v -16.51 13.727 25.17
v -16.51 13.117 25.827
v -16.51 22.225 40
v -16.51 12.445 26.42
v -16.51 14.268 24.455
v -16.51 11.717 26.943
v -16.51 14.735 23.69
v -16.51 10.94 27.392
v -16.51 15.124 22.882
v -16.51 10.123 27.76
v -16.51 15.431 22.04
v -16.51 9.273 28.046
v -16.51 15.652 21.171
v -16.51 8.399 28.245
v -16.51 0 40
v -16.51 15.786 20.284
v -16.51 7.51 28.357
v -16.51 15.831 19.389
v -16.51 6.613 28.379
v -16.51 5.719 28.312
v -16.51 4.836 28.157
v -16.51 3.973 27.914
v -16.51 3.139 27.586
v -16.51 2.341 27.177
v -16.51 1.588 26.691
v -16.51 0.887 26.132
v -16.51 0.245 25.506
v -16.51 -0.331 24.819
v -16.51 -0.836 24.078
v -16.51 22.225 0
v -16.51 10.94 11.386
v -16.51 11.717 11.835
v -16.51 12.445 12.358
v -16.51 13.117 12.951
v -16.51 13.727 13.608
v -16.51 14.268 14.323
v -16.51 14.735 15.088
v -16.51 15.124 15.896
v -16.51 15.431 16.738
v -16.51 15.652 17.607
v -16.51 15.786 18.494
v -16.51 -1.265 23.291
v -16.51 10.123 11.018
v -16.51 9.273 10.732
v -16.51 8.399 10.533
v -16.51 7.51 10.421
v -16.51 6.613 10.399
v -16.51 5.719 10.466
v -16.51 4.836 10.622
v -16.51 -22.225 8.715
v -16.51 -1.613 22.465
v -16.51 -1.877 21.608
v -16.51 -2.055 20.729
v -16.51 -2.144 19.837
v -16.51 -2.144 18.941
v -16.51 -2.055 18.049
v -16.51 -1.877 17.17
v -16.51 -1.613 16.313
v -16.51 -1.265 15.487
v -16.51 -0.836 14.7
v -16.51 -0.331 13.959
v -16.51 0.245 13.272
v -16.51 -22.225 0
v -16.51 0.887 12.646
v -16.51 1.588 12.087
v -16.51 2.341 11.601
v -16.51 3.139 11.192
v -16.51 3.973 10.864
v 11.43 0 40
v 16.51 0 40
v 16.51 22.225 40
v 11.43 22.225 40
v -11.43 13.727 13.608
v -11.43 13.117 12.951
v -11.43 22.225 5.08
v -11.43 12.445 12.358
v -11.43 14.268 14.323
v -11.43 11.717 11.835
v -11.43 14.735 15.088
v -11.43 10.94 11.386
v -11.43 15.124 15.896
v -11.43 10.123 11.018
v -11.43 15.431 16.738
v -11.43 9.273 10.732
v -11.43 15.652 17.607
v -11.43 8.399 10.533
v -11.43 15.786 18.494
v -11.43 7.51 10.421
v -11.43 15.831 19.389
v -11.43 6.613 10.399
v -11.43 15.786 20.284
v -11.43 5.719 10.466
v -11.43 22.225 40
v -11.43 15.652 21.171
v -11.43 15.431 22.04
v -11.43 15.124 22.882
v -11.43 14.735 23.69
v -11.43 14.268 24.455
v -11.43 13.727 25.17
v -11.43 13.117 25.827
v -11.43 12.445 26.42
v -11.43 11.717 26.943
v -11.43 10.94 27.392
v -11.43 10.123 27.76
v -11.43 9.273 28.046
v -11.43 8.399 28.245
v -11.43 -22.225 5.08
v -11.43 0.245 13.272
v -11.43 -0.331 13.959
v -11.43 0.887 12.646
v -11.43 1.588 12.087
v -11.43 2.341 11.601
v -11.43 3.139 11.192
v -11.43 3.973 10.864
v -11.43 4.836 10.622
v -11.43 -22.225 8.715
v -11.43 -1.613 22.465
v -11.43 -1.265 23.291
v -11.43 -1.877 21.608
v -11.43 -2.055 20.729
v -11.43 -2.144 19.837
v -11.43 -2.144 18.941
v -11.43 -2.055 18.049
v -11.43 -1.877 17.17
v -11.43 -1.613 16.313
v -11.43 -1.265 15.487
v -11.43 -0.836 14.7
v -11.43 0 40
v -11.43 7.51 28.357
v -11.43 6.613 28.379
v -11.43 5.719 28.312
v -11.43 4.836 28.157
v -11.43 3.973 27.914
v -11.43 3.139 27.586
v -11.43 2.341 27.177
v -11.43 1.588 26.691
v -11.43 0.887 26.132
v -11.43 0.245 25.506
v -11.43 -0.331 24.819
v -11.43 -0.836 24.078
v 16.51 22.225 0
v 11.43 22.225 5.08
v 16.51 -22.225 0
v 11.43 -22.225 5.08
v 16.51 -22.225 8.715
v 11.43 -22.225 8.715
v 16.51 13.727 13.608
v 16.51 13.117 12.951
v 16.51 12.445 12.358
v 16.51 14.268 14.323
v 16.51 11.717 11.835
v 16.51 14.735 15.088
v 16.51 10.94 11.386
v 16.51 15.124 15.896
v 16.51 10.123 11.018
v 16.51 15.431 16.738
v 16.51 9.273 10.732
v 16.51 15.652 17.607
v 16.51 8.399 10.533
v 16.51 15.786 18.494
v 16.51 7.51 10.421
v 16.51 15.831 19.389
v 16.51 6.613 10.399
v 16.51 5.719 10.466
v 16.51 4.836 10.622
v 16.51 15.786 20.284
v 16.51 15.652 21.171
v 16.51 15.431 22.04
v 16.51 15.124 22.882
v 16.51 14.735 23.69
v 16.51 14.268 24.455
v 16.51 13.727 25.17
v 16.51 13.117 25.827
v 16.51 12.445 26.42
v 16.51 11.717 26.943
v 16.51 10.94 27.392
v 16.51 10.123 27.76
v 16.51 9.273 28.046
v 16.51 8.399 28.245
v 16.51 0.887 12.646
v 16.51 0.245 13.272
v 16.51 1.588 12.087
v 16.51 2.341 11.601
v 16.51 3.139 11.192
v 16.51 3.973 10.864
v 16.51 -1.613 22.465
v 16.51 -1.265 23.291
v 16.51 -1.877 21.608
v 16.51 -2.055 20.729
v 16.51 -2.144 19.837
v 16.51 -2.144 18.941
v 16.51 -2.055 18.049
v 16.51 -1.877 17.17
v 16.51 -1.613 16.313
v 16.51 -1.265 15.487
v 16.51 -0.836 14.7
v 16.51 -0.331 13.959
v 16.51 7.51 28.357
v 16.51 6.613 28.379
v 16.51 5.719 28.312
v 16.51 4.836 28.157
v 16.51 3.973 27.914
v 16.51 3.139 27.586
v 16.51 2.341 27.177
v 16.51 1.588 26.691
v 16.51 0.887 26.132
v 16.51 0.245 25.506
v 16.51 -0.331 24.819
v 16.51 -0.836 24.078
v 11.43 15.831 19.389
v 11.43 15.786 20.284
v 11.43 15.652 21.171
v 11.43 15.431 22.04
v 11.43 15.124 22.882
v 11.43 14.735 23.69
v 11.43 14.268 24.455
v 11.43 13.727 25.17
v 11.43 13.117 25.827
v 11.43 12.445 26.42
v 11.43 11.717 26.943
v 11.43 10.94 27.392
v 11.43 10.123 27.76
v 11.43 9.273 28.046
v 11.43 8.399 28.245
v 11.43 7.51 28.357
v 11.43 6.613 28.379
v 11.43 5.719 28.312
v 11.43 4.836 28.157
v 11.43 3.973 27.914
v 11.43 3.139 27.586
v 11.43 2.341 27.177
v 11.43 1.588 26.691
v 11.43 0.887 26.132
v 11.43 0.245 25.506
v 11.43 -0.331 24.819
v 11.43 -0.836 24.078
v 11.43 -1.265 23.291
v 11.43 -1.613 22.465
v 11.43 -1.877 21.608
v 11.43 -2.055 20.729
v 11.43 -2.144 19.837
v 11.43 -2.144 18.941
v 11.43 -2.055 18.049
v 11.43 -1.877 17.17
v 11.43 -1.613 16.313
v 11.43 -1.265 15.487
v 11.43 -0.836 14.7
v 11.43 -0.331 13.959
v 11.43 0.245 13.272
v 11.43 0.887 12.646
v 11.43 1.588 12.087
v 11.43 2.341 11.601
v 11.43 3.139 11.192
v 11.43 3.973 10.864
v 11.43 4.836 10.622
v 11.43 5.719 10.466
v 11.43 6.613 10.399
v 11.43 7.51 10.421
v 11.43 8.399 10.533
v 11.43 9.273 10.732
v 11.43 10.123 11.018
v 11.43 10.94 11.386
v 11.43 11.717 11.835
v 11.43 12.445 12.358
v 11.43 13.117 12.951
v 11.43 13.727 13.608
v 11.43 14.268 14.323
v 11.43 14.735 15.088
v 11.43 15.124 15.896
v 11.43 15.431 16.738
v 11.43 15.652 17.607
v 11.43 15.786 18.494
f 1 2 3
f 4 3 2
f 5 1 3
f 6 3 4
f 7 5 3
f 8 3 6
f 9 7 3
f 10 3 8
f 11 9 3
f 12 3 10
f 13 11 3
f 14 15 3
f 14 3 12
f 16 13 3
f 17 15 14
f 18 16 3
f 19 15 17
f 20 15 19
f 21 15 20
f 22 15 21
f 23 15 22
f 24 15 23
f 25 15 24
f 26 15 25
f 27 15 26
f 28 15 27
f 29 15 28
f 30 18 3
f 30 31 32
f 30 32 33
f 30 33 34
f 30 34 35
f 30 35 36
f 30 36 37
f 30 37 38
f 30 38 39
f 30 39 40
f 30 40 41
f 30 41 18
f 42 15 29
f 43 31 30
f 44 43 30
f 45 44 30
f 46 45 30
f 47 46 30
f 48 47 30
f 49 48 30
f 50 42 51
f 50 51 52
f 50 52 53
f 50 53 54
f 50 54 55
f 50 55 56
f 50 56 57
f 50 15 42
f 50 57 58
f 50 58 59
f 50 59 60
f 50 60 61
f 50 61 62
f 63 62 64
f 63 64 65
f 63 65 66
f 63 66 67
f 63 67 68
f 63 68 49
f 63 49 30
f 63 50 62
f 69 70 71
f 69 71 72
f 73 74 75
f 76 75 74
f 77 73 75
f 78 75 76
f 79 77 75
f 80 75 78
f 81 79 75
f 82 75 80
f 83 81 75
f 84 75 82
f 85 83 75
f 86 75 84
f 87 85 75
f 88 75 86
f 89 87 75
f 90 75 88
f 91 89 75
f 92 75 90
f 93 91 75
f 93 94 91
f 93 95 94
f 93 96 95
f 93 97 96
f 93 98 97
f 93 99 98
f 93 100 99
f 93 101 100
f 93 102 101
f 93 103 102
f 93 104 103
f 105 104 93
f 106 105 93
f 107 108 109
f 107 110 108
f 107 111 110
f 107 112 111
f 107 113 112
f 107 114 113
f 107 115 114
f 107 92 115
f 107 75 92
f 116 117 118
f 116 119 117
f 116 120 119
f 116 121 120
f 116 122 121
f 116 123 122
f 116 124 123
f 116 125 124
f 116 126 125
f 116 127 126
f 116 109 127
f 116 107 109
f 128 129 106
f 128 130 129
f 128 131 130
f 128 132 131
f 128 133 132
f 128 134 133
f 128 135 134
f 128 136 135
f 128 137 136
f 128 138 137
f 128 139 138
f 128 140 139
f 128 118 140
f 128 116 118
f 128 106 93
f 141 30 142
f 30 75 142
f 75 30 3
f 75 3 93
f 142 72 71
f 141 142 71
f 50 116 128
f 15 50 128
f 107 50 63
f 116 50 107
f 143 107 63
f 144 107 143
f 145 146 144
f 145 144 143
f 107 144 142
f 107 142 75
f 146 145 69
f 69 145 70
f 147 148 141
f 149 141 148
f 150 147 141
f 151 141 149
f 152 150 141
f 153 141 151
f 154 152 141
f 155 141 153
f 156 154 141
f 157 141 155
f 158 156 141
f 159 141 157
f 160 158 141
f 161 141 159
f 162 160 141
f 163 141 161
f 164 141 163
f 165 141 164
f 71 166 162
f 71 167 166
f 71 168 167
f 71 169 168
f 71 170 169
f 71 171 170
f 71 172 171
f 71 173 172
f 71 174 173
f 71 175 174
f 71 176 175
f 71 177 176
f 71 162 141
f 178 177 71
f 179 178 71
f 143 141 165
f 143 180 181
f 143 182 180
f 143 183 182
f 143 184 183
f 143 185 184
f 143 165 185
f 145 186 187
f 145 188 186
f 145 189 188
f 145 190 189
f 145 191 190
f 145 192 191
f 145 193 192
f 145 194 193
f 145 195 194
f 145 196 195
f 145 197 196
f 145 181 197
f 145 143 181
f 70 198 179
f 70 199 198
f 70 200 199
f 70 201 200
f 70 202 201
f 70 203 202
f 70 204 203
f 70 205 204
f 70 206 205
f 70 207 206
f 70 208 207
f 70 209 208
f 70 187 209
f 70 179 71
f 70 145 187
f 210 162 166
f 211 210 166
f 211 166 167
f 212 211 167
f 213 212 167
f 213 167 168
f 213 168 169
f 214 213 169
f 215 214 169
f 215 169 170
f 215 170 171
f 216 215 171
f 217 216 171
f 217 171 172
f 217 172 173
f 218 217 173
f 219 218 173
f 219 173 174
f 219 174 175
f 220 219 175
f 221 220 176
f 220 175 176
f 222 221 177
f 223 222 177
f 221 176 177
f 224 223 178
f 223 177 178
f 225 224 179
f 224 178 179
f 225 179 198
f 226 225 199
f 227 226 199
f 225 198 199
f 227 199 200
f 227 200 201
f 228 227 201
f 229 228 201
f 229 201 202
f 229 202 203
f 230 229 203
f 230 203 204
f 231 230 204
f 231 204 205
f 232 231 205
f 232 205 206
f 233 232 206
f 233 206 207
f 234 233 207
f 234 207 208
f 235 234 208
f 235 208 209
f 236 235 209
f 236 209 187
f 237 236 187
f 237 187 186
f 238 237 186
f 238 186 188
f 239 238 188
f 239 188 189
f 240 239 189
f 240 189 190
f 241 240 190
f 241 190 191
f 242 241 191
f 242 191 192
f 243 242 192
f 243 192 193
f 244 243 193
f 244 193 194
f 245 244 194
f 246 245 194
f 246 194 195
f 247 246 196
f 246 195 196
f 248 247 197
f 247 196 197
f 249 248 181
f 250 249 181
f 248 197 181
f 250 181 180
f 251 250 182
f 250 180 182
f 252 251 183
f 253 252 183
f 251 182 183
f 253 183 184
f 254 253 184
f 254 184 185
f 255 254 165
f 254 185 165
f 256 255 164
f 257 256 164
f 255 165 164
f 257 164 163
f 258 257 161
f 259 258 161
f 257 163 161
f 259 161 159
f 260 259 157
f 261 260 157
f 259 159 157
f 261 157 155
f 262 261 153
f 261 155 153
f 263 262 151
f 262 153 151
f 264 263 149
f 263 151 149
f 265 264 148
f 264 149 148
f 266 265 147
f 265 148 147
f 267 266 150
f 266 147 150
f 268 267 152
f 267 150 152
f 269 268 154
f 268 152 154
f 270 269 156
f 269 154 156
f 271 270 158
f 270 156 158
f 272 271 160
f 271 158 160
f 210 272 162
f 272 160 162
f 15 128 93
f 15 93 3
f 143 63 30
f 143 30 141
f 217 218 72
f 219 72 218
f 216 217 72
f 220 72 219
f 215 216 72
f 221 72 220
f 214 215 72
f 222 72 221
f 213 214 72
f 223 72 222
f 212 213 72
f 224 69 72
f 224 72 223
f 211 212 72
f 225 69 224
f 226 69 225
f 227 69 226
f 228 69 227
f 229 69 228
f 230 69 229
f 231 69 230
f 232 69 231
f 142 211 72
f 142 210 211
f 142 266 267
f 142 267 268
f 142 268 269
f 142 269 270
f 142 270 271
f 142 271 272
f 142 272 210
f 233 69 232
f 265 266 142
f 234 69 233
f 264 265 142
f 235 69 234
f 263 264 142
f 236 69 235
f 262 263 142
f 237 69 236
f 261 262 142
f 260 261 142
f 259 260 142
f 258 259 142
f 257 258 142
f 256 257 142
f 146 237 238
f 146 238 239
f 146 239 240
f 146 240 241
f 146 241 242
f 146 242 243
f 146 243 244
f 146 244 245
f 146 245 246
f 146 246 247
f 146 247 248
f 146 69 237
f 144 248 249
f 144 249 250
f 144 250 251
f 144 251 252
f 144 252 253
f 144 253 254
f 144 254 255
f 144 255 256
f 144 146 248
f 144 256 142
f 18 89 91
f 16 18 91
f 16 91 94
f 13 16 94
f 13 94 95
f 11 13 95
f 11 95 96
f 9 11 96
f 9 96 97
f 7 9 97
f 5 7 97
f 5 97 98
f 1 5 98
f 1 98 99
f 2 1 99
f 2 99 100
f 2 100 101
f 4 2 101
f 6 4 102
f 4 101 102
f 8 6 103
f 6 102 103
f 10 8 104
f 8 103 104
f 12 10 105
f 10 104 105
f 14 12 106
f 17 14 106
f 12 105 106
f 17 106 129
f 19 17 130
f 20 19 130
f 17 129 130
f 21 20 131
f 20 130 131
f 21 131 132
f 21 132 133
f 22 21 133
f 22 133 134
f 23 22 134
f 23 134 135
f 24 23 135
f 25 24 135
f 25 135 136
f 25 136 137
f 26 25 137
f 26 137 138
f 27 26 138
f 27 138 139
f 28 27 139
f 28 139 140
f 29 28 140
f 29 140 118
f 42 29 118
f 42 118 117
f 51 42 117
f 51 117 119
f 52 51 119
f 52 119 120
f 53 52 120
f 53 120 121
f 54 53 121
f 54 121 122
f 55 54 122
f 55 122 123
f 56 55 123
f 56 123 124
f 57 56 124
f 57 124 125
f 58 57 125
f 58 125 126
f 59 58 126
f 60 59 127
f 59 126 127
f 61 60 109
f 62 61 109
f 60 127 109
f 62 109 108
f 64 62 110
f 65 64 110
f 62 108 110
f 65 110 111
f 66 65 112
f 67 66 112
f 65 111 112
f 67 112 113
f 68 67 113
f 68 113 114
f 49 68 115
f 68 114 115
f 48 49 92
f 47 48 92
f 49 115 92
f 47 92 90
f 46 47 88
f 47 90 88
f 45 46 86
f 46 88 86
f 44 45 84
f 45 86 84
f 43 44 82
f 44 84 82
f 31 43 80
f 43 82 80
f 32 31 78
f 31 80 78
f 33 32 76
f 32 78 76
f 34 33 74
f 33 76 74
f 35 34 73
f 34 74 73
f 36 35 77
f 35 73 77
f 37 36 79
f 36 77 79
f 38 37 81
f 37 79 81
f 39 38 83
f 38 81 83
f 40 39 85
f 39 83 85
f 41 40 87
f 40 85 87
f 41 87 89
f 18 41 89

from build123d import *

# Parameters (mm, degrees)
F1_DEPTH = 22.225
F3_DEPTH = 33.02
F4_R     = 8.992991
F5_DEPTH = 33.021


with BuildPart() as f1:
    # F0 (on Front) → F1 (new body, symmetric)
    with BuildSketch(Plane.XZ):
        Polygon((-16.51, 40), (-16.51, 0), (0, 0), (16.51, 0), (16.51, 40), (11.43, 40), (11.43, 5.08), (0, 5.08), (-11.43, 5.08), (-11.43, 40), align=None)
    extrude(amount=F1_DEPTH, both=True)

    # F2 (on face) → F3 (cut)
    with BuildSketch(Plane.YZ.offset(16.51)):
        Polygon((-22.225, 40), (-22.225, 8.714859), (0, 40), align=None)
    extrude(amount=-F3_DEPTH, mode=Mode.SUBTRACT)

    # F4 (on face) → F5 (cut, through all)
    with BuildSketch(Plane.YZ.offset(16.51)):
        with Locations((6.837589, 19.389018)):
            Circle(F4_R)
    extrude(amount=-F5_DEPTH, mode=Mode.SUBTRACT)


solid = f1.part
